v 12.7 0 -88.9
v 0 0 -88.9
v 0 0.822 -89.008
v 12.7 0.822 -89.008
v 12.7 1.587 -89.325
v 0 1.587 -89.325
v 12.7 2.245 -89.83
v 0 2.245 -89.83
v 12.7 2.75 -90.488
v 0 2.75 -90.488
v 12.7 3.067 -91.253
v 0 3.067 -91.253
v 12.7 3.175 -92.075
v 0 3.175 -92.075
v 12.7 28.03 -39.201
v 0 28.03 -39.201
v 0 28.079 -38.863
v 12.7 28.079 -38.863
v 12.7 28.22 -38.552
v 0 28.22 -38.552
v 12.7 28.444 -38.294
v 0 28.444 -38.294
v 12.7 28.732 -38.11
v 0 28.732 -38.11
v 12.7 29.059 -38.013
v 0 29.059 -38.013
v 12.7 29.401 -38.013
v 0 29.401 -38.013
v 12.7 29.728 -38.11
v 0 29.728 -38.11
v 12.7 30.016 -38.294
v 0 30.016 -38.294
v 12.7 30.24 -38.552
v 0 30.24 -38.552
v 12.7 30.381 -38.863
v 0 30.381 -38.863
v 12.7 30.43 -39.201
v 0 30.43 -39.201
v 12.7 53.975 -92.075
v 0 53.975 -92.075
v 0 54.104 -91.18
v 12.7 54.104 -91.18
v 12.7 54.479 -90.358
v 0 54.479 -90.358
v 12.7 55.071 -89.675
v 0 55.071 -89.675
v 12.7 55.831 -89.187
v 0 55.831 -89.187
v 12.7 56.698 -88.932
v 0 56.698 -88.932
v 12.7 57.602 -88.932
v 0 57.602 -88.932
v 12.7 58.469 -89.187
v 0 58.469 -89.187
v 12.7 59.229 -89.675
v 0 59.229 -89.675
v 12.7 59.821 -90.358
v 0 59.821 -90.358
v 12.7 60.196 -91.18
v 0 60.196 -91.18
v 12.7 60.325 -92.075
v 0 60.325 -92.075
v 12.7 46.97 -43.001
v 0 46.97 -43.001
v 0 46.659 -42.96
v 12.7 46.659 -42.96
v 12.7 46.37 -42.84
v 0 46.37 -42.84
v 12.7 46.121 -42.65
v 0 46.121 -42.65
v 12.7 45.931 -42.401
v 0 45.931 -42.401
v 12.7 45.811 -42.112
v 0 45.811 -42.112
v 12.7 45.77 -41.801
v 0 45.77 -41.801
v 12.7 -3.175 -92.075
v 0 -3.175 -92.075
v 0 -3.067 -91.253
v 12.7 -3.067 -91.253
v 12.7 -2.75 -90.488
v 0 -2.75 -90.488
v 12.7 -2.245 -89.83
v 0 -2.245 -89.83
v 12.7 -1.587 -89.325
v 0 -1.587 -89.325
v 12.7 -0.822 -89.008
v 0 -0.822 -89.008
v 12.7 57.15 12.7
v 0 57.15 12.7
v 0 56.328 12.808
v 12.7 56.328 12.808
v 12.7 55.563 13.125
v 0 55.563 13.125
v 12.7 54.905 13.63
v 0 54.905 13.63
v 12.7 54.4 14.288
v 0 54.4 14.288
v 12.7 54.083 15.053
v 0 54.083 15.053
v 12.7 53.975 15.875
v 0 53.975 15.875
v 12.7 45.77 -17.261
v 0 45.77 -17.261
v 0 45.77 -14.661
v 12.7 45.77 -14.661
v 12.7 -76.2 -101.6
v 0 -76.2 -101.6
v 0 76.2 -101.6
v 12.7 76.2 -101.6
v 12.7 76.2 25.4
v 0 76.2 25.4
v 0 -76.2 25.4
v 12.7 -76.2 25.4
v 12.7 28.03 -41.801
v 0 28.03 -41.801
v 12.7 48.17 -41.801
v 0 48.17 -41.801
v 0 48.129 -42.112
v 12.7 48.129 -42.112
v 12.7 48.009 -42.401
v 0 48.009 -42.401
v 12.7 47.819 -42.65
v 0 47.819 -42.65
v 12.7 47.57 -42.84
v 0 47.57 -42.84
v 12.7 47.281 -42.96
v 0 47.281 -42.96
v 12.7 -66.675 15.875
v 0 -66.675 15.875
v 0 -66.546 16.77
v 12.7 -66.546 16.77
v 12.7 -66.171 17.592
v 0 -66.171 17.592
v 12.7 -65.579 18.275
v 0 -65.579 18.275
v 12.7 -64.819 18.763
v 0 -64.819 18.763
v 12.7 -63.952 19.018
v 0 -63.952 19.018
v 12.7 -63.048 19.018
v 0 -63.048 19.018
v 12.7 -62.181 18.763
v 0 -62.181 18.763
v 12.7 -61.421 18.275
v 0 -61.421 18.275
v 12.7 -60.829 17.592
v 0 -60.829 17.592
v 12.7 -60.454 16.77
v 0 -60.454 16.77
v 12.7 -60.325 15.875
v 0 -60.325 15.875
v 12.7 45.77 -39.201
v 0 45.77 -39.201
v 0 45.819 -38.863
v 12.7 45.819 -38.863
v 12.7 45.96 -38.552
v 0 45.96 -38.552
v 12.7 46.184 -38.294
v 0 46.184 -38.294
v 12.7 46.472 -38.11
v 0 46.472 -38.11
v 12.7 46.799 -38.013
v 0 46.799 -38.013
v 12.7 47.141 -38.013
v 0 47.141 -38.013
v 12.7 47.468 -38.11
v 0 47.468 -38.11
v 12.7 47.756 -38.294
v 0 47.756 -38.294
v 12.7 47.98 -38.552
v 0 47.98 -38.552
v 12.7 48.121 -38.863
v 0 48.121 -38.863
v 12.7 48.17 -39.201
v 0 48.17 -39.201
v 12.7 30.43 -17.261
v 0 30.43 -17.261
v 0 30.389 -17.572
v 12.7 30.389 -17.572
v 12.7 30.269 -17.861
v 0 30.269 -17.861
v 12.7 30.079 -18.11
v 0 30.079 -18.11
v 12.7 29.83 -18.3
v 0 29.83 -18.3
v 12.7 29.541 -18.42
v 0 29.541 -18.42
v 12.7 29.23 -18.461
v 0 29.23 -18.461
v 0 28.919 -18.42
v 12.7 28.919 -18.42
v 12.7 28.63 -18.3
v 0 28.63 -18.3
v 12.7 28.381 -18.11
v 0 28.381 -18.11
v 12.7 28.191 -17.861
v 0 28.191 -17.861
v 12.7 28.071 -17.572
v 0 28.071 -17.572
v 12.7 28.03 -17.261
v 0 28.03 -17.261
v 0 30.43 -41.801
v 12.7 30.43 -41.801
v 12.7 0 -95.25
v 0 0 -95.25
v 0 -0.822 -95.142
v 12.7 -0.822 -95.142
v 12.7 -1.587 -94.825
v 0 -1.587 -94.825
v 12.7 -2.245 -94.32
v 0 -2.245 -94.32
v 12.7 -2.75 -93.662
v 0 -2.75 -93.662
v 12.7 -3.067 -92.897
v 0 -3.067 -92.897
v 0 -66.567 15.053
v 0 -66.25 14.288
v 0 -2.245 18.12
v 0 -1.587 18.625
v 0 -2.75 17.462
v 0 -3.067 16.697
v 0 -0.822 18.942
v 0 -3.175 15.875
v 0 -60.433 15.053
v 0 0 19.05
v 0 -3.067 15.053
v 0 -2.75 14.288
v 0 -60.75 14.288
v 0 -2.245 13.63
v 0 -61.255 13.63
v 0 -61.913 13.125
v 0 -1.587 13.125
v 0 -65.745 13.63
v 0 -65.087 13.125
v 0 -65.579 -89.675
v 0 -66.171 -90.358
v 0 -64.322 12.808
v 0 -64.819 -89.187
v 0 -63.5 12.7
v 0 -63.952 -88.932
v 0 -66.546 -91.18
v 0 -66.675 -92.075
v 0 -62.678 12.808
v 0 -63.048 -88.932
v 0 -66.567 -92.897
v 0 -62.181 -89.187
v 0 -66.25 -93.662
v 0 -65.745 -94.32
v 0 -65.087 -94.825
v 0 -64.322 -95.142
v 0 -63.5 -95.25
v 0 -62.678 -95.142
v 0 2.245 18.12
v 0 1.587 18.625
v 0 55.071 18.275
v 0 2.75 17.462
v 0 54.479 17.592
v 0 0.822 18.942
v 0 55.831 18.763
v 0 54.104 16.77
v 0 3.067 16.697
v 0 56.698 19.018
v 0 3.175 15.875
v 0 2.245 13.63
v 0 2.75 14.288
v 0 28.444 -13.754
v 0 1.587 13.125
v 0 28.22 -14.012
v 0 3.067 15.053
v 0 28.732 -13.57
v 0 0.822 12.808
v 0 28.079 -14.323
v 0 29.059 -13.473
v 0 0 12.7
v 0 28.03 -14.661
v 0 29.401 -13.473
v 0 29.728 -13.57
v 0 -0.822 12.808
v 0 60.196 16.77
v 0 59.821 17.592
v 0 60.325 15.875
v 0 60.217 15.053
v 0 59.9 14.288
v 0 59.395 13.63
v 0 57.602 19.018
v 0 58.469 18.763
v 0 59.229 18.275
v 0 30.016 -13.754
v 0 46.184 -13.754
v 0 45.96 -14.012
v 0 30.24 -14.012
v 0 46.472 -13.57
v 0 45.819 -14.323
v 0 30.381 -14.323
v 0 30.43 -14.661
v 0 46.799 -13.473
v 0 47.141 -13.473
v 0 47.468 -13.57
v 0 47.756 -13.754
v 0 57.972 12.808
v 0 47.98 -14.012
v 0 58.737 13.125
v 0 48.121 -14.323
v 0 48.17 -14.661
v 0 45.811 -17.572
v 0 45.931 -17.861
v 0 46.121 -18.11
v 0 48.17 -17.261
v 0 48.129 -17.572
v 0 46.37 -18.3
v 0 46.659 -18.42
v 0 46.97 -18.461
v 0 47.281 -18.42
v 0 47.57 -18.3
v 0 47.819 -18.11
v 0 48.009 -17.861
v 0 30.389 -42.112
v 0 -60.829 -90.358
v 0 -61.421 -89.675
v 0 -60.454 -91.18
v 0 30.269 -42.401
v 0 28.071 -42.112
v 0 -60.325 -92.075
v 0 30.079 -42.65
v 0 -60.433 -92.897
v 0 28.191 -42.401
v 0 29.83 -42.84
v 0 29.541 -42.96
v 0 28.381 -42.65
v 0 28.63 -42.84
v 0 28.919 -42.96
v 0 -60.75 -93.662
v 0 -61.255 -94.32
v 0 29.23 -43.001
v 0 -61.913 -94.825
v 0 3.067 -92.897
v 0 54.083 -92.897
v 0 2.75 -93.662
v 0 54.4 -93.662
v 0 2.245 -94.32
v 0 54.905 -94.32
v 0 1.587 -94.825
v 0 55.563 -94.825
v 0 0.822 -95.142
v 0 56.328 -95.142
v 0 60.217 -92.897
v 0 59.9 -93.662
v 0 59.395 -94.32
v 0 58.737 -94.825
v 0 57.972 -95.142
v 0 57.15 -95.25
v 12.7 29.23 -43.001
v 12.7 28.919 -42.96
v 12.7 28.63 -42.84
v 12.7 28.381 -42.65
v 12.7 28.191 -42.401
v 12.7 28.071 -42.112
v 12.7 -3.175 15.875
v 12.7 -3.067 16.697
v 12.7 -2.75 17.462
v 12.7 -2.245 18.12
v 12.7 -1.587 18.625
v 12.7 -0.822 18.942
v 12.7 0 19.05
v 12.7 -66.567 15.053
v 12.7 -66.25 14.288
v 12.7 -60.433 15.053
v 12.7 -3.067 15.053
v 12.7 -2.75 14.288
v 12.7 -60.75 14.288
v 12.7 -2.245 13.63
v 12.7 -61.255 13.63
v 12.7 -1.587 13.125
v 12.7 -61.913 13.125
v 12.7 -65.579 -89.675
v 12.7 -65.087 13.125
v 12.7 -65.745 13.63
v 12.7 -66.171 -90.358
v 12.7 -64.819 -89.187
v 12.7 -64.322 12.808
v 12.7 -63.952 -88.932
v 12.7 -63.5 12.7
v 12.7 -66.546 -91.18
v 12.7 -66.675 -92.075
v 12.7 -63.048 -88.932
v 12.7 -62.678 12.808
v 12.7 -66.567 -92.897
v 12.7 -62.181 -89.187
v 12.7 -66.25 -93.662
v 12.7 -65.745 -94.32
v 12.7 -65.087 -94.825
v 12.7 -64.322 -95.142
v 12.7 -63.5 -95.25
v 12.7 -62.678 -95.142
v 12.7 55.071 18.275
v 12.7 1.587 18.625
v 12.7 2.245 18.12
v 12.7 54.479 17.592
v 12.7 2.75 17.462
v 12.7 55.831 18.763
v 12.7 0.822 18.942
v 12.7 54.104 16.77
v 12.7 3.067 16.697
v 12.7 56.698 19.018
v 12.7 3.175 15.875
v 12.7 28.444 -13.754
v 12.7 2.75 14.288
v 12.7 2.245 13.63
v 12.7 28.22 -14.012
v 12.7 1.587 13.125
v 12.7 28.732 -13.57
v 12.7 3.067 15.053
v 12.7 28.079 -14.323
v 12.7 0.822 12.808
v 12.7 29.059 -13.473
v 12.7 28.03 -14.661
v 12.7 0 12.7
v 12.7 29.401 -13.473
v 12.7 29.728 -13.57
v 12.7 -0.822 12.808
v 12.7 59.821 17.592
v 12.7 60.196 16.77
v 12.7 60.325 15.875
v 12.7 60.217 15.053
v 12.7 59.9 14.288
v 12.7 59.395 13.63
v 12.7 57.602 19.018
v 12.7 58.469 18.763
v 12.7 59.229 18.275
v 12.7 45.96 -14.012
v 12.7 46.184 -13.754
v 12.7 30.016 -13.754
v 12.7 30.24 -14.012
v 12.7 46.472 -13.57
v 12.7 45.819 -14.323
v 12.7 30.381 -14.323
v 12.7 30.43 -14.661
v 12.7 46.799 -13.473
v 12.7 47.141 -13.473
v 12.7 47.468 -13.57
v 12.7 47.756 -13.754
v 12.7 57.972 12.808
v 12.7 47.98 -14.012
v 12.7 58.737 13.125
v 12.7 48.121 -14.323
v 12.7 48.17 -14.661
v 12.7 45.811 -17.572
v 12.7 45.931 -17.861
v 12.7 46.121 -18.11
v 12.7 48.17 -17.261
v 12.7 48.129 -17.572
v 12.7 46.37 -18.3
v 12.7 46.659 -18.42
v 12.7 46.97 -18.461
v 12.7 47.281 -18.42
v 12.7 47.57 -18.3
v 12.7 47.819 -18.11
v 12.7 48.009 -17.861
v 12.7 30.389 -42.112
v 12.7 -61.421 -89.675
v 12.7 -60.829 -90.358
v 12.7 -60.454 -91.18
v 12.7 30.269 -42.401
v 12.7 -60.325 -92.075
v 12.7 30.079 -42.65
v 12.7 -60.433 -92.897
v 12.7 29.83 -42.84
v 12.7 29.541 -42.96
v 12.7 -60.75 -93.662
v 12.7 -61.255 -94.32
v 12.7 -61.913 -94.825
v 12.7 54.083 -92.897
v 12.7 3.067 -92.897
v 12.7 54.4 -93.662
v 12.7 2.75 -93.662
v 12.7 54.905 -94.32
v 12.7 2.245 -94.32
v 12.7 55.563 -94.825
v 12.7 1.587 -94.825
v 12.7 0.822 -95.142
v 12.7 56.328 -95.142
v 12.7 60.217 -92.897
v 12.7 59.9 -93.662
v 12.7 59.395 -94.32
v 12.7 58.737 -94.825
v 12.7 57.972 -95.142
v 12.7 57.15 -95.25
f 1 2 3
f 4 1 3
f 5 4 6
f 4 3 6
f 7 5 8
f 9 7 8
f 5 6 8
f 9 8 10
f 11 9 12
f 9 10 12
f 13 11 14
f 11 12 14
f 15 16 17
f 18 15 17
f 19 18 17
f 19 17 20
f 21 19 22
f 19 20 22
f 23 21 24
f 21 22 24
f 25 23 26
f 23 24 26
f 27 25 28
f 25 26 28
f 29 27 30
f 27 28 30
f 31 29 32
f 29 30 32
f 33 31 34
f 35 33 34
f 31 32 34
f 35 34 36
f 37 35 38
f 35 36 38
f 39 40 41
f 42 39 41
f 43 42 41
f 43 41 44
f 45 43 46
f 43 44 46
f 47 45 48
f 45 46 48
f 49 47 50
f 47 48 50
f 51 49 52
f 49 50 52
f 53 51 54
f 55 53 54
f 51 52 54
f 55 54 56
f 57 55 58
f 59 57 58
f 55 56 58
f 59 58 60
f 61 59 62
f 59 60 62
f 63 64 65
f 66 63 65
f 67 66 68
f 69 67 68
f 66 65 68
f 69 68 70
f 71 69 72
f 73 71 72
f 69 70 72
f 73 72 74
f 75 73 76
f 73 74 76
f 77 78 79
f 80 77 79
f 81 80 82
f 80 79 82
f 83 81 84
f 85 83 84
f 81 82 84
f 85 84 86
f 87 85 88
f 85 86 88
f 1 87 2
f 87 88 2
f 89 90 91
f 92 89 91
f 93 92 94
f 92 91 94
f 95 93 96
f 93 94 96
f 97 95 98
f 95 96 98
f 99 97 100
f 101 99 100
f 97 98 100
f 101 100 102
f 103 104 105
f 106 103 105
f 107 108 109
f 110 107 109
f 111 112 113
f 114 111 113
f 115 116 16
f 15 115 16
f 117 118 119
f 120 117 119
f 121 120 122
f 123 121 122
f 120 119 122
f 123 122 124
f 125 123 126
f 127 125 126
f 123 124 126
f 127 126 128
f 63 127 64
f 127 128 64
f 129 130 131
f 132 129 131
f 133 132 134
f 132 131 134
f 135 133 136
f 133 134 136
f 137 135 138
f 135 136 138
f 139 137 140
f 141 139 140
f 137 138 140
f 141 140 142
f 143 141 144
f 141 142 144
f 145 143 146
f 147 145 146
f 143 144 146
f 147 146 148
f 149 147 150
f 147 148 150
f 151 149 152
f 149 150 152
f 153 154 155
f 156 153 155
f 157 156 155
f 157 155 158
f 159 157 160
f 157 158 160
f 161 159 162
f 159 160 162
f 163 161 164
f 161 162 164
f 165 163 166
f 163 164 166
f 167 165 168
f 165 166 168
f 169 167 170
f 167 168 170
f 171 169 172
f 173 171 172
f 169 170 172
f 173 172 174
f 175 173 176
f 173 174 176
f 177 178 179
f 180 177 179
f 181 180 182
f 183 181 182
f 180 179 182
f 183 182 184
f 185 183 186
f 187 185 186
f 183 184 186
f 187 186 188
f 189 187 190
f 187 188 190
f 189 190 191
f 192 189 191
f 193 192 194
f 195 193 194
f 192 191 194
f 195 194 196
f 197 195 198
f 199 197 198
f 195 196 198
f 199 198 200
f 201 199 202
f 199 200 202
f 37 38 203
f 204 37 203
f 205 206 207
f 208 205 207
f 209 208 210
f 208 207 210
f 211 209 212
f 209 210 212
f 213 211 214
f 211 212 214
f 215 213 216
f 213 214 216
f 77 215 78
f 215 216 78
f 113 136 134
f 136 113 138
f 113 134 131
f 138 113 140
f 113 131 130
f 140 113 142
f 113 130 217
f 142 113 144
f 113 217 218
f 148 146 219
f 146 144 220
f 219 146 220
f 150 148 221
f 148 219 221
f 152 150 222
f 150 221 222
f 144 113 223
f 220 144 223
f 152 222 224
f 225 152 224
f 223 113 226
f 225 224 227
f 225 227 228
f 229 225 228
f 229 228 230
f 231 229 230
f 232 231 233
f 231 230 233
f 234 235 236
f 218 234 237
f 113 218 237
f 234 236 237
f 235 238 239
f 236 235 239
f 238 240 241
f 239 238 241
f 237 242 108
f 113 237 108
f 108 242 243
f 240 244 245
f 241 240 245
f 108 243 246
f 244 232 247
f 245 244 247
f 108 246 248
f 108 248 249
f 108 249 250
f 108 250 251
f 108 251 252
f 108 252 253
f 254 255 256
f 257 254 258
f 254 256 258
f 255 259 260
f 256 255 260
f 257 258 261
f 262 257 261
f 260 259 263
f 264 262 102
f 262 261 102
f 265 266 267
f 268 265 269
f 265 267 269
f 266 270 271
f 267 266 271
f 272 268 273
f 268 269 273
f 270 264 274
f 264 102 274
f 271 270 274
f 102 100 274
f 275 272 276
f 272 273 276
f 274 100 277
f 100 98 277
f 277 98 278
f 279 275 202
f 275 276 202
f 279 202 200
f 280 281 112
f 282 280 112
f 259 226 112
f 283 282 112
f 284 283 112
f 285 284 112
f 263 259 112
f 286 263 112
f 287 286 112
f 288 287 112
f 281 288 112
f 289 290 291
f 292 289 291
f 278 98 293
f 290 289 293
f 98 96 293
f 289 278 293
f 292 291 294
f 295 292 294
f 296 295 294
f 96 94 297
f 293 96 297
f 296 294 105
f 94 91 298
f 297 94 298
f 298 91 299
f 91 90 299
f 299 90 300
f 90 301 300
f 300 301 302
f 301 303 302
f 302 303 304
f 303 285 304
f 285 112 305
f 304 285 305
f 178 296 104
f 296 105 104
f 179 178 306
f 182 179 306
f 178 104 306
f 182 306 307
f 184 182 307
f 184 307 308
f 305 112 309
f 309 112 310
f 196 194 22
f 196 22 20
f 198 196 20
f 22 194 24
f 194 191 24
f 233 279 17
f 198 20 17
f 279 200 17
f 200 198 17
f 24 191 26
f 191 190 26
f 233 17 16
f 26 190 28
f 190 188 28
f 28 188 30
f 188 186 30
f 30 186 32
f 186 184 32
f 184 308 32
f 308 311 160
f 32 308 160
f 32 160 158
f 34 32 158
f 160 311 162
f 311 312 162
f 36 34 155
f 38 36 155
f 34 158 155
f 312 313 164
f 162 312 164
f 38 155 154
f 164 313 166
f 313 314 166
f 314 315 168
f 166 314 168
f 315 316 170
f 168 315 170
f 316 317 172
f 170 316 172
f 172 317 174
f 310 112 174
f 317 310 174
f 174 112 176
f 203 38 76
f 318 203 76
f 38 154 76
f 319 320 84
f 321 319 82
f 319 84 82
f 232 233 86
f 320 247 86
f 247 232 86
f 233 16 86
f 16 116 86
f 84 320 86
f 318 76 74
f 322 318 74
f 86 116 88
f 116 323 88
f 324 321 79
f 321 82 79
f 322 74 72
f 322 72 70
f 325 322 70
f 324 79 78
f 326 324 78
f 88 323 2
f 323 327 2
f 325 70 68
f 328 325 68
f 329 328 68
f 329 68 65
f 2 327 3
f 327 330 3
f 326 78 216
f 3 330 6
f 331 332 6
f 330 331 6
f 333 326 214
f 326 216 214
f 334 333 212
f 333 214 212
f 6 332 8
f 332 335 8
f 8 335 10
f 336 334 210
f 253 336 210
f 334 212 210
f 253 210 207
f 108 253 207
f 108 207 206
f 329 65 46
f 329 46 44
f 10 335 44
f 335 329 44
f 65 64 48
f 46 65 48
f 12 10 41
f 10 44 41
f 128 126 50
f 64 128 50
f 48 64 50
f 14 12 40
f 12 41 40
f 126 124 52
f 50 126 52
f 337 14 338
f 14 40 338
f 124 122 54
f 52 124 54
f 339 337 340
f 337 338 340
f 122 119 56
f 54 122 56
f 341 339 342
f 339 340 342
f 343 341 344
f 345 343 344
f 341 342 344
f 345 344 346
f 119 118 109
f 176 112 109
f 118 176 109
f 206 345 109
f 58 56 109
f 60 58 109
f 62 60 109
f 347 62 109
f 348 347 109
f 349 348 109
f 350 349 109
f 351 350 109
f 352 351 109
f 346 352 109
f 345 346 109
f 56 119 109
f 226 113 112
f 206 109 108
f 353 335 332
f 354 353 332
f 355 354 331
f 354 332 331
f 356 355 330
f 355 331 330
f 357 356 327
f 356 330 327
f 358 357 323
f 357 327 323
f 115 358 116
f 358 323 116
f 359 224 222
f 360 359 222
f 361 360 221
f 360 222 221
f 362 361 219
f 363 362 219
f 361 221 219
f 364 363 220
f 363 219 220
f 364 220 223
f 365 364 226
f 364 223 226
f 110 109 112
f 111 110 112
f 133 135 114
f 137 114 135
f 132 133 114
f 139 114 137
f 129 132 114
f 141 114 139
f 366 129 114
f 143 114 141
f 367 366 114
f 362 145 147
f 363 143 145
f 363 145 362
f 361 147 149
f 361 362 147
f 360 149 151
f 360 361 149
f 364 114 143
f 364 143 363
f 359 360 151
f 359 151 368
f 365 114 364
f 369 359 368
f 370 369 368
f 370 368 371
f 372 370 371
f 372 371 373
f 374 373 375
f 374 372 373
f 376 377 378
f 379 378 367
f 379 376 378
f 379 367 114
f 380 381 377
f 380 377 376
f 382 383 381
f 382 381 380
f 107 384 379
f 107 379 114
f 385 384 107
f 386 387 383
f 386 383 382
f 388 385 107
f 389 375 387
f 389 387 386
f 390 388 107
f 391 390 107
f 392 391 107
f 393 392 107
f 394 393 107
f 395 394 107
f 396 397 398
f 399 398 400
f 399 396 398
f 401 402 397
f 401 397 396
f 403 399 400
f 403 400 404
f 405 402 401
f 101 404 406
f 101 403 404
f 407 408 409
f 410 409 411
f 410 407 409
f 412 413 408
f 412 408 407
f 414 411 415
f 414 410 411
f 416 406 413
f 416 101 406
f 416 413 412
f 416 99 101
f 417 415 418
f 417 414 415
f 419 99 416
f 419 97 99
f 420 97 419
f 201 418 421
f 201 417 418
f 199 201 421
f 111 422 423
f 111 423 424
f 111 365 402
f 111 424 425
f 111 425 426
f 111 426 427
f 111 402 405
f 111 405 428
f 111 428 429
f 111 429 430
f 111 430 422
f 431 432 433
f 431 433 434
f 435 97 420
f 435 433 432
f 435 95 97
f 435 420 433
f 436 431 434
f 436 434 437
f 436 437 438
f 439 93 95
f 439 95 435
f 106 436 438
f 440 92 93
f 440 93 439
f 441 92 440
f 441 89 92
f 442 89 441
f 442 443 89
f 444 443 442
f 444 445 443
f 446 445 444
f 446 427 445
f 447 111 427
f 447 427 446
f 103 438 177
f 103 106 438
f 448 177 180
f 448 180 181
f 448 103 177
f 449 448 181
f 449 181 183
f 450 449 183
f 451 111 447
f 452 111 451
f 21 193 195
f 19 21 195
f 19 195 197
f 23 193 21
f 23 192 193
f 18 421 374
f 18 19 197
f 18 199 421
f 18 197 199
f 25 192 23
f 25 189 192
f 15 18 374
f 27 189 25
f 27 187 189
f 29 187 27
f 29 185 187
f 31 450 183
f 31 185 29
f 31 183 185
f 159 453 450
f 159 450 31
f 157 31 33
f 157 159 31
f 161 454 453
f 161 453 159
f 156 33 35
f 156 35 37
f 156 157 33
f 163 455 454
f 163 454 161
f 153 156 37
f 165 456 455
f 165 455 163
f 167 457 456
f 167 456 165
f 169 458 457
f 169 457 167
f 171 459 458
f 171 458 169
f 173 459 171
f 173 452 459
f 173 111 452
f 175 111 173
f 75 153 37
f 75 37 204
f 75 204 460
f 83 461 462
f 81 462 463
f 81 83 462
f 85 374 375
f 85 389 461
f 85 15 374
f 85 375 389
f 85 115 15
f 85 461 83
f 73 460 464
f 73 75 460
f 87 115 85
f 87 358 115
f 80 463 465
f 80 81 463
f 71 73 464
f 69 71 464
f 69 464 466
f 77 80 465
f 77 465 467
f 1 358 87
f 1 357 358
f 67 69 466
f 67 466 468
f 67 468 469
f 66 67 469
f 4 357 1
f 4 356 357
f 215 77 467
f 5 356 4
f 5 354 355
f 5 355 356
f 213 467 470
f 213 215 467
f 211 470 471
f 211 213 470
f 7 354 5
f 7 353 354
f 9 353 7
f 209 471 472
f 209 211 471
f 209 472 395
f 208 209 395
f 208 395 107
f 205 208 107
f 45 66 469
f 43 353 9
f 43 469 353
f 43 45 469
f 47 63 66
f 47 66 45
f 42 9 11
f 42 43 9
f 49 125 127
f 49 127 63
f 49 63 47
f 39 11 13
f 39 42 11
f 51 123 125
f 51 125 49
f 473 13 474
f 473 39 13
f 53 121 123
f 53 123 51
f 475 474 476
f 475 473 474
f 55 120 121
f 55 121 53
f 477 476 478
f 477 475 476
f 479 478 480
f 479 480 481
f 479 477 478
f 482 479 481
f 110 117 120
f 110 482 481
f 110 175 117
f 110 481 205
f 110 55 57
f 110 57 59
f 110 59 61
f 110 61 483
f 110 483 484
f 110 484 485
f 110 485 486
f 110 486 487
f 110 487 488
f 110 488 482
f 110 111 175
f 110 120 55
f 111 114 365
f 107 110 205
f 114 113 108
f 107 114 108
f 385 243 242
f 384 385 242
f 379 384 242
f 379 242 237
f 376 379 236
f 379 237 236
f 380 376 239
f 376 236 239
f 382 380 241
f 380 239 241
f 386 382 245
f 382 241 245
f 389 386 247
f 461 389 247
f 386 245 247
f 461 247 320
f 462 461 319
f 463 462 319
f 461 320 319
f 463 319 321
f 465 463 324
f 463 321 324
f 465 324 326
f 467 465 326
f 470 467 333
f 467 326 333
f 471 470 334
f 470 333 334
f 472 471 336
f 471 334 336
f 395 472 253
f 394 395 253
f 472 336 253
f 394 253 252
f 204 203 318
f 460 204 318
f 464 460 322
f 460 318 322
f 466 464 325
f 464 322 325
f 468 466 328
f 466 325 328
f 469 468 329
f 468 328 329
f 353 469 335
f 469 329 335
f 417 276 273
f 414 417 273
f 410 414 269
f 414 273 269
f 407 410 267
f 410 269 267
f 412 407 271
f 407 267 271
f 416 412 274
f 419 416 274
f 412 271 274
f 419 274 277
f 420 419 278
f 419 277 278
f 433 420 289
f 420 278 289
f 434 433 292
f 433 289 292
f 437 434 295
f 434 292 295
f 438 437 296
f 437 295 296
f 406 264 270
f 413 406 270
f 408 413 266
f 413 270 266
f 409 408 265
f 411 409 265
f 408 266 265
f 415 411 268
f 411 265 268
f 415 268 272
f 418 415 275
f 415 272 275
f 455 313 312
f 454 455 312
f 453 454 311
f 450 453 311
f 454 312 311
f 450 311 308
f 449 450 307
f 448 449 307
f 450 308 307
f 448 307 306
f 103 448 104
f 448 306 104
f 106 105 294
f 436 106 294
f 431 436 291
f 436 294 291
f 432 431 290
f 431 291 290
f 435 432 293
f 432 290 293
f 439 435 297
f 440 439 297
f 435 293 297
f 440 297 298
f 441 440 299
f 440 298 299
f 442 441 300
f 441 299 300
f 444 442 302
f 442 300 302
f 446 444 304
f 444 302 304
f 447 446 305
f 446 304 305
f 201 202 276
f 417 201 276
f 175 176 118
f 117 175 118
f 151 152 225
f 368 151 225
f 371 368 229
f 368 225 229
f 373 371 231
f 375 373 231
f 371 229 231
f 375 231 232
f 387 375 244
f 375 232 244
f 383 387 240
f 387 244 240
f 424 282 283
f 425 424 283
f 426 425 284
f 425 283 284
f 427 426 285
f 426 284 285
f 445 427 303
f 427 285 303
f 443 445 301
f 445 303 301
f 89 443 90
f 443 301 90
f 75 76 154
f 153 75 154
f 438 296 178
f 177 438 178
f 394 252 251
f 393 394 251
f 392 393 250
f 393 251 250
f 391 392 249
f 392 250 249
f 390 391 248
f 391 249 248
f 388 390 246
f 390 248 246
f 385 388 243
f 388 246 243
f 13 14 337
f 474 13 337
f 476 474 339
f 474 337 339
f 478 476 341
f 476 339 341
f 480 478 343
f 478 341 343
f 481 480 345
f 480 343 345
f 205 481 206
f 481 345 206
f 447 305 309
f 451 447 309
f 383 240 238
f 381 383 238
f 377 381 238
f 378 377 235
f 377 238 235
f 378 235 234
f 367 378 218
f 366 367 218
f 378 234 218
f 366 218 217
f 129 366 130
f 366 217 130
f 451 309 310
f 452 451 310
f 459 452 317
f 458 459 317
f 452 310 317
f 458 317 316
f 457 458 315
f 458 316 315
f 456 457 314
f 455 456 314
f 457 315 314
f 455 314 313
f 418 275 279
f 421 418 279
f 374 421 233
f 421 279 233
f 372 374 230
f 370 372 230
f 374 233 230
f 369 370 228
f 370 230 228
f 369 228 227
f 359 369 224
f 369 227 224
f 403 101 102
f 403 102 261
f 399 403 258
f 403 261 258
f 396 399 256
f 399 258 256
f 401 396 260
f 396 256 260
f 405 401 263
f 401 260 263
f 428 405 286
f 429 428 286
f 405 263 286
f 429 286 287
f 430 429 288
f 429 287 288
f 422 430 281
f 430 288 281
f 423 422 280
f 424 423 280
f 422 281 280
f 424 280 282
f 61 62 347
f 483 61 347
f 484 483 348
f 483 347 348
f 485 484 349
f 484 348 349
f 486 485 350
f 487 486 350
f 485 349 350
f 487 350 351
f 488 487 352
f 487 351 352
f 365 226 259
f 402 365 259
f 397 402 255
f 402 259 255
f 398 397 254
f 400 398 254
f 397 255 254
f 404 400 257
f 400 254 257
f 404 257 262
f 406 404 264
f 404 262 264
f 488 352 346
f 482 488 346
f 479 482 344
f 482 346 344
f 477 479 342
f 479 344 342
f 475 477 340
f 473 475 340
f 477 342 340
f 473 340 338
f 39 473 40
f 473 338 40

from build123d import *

# Parameters (mm, degrees)
SKETCH1_W           = 127
SKETCH1_H           = 152.4
SKETCH1_R           = 3.175
BOSS_EXTRUDE1_DEPTH = 12.7


with BuildPart() as part:
    # Sketch1 → Boss-Extrude1 (new body)
    with BuildSketch(Plane(origin=(0, 0, 0), x_dir=(0, 0, -1), z_dir=(1, 0, 0))):
        with Locations((38.1, 0)):
            Rectangle(SKETCH1_W, SKETCH1_H)
        with Locations((-15.875, 57.15)):
            Circle(SKETCH1_R, mode=Mode.SUBTRACT)
        with Locations((-15.875, 0)):
            Circle(SKETCH1_R, mode=Mode.SUBTRACT)
        with Locations((92.075, 57.15)):
            Circle(SKETCH1_R, mode=Mode.SUBTRACT)
        with Locations((92.075, 0)):
            Circle(SKETCH1_R, mode=Mode.SUBTRACT)
        with Locations((-15.875, -63.5)):
            Circle(SKETCH1_R, mode=Mode.SUBTRACT)
        with Locations((92.075, -63.5)):
            Circle(SKETCH1_R, mode=Mode.SUBTRACT)
        with BuildLine():
            ThreePointArc((17.261210647, 30.43), (18.461210647, 29.23), (17.261210647, 28.03))
            Line((17.261210647, 28.03), (14.661210647, 28.03))
            ThreePointArc((14.661210647, 28.03), (13.461210647, 29.23), (14.661210647, 30.43))
            Line((14.661210647, 30.43), (17.261210647, 30.43))
        make_face(mode=Mode.SUBTRACT)
        with BuildLine():
            Line((41.801210647, 28.03), (39.201210647, 28.03))
            ThreePointArc((39.201210647, 28.03), (38.001210647, 29.23), (39.201210647, 30.43))
            Line((39.201210647, 30.43), (41.801210647, 30.43))
            ThreePointArc((41.801210647, 30.43), (43.001210647, 29.23), (41.801210647, 28.03))
        make_face(mode=Mode.SUBTRACT)
        with BuildLine():
            ThreePointArc((39.201210647, 45.77), (38.001210647, 46.97), (39.201210647, 48.17))
            Line((39.201210647, 48.17), (41.801210647, 48.17))
            ThreePointArc((41.801210647, 48.17), (43.001210647, 46.97), (41.801210647, 45.77))
            Line((41.801210647, 45.77), (39.201210647, 45.77))
        make_face(mode=Mode.SUBTRACT)
        with BuildLine():
            Line((14.661210647, 48.17), (17.261210647, 48.17))
            ThreePointArc((17.261210647, 48.17), (18.461210647, 46.97), (17.261210647, 45.77))
            Line((17.261210647, 45.77), (14.661210647, 45.77))
            ThreePointArc((14.661210647, 45.77), (13.461210647, 46.97), (14.661210647, 48.17))
        make_face(mode=Mode.SUBTRACT)
    extrude(amount=BOSS_EXTRUDE1_DEPTH)


solid = part.part
